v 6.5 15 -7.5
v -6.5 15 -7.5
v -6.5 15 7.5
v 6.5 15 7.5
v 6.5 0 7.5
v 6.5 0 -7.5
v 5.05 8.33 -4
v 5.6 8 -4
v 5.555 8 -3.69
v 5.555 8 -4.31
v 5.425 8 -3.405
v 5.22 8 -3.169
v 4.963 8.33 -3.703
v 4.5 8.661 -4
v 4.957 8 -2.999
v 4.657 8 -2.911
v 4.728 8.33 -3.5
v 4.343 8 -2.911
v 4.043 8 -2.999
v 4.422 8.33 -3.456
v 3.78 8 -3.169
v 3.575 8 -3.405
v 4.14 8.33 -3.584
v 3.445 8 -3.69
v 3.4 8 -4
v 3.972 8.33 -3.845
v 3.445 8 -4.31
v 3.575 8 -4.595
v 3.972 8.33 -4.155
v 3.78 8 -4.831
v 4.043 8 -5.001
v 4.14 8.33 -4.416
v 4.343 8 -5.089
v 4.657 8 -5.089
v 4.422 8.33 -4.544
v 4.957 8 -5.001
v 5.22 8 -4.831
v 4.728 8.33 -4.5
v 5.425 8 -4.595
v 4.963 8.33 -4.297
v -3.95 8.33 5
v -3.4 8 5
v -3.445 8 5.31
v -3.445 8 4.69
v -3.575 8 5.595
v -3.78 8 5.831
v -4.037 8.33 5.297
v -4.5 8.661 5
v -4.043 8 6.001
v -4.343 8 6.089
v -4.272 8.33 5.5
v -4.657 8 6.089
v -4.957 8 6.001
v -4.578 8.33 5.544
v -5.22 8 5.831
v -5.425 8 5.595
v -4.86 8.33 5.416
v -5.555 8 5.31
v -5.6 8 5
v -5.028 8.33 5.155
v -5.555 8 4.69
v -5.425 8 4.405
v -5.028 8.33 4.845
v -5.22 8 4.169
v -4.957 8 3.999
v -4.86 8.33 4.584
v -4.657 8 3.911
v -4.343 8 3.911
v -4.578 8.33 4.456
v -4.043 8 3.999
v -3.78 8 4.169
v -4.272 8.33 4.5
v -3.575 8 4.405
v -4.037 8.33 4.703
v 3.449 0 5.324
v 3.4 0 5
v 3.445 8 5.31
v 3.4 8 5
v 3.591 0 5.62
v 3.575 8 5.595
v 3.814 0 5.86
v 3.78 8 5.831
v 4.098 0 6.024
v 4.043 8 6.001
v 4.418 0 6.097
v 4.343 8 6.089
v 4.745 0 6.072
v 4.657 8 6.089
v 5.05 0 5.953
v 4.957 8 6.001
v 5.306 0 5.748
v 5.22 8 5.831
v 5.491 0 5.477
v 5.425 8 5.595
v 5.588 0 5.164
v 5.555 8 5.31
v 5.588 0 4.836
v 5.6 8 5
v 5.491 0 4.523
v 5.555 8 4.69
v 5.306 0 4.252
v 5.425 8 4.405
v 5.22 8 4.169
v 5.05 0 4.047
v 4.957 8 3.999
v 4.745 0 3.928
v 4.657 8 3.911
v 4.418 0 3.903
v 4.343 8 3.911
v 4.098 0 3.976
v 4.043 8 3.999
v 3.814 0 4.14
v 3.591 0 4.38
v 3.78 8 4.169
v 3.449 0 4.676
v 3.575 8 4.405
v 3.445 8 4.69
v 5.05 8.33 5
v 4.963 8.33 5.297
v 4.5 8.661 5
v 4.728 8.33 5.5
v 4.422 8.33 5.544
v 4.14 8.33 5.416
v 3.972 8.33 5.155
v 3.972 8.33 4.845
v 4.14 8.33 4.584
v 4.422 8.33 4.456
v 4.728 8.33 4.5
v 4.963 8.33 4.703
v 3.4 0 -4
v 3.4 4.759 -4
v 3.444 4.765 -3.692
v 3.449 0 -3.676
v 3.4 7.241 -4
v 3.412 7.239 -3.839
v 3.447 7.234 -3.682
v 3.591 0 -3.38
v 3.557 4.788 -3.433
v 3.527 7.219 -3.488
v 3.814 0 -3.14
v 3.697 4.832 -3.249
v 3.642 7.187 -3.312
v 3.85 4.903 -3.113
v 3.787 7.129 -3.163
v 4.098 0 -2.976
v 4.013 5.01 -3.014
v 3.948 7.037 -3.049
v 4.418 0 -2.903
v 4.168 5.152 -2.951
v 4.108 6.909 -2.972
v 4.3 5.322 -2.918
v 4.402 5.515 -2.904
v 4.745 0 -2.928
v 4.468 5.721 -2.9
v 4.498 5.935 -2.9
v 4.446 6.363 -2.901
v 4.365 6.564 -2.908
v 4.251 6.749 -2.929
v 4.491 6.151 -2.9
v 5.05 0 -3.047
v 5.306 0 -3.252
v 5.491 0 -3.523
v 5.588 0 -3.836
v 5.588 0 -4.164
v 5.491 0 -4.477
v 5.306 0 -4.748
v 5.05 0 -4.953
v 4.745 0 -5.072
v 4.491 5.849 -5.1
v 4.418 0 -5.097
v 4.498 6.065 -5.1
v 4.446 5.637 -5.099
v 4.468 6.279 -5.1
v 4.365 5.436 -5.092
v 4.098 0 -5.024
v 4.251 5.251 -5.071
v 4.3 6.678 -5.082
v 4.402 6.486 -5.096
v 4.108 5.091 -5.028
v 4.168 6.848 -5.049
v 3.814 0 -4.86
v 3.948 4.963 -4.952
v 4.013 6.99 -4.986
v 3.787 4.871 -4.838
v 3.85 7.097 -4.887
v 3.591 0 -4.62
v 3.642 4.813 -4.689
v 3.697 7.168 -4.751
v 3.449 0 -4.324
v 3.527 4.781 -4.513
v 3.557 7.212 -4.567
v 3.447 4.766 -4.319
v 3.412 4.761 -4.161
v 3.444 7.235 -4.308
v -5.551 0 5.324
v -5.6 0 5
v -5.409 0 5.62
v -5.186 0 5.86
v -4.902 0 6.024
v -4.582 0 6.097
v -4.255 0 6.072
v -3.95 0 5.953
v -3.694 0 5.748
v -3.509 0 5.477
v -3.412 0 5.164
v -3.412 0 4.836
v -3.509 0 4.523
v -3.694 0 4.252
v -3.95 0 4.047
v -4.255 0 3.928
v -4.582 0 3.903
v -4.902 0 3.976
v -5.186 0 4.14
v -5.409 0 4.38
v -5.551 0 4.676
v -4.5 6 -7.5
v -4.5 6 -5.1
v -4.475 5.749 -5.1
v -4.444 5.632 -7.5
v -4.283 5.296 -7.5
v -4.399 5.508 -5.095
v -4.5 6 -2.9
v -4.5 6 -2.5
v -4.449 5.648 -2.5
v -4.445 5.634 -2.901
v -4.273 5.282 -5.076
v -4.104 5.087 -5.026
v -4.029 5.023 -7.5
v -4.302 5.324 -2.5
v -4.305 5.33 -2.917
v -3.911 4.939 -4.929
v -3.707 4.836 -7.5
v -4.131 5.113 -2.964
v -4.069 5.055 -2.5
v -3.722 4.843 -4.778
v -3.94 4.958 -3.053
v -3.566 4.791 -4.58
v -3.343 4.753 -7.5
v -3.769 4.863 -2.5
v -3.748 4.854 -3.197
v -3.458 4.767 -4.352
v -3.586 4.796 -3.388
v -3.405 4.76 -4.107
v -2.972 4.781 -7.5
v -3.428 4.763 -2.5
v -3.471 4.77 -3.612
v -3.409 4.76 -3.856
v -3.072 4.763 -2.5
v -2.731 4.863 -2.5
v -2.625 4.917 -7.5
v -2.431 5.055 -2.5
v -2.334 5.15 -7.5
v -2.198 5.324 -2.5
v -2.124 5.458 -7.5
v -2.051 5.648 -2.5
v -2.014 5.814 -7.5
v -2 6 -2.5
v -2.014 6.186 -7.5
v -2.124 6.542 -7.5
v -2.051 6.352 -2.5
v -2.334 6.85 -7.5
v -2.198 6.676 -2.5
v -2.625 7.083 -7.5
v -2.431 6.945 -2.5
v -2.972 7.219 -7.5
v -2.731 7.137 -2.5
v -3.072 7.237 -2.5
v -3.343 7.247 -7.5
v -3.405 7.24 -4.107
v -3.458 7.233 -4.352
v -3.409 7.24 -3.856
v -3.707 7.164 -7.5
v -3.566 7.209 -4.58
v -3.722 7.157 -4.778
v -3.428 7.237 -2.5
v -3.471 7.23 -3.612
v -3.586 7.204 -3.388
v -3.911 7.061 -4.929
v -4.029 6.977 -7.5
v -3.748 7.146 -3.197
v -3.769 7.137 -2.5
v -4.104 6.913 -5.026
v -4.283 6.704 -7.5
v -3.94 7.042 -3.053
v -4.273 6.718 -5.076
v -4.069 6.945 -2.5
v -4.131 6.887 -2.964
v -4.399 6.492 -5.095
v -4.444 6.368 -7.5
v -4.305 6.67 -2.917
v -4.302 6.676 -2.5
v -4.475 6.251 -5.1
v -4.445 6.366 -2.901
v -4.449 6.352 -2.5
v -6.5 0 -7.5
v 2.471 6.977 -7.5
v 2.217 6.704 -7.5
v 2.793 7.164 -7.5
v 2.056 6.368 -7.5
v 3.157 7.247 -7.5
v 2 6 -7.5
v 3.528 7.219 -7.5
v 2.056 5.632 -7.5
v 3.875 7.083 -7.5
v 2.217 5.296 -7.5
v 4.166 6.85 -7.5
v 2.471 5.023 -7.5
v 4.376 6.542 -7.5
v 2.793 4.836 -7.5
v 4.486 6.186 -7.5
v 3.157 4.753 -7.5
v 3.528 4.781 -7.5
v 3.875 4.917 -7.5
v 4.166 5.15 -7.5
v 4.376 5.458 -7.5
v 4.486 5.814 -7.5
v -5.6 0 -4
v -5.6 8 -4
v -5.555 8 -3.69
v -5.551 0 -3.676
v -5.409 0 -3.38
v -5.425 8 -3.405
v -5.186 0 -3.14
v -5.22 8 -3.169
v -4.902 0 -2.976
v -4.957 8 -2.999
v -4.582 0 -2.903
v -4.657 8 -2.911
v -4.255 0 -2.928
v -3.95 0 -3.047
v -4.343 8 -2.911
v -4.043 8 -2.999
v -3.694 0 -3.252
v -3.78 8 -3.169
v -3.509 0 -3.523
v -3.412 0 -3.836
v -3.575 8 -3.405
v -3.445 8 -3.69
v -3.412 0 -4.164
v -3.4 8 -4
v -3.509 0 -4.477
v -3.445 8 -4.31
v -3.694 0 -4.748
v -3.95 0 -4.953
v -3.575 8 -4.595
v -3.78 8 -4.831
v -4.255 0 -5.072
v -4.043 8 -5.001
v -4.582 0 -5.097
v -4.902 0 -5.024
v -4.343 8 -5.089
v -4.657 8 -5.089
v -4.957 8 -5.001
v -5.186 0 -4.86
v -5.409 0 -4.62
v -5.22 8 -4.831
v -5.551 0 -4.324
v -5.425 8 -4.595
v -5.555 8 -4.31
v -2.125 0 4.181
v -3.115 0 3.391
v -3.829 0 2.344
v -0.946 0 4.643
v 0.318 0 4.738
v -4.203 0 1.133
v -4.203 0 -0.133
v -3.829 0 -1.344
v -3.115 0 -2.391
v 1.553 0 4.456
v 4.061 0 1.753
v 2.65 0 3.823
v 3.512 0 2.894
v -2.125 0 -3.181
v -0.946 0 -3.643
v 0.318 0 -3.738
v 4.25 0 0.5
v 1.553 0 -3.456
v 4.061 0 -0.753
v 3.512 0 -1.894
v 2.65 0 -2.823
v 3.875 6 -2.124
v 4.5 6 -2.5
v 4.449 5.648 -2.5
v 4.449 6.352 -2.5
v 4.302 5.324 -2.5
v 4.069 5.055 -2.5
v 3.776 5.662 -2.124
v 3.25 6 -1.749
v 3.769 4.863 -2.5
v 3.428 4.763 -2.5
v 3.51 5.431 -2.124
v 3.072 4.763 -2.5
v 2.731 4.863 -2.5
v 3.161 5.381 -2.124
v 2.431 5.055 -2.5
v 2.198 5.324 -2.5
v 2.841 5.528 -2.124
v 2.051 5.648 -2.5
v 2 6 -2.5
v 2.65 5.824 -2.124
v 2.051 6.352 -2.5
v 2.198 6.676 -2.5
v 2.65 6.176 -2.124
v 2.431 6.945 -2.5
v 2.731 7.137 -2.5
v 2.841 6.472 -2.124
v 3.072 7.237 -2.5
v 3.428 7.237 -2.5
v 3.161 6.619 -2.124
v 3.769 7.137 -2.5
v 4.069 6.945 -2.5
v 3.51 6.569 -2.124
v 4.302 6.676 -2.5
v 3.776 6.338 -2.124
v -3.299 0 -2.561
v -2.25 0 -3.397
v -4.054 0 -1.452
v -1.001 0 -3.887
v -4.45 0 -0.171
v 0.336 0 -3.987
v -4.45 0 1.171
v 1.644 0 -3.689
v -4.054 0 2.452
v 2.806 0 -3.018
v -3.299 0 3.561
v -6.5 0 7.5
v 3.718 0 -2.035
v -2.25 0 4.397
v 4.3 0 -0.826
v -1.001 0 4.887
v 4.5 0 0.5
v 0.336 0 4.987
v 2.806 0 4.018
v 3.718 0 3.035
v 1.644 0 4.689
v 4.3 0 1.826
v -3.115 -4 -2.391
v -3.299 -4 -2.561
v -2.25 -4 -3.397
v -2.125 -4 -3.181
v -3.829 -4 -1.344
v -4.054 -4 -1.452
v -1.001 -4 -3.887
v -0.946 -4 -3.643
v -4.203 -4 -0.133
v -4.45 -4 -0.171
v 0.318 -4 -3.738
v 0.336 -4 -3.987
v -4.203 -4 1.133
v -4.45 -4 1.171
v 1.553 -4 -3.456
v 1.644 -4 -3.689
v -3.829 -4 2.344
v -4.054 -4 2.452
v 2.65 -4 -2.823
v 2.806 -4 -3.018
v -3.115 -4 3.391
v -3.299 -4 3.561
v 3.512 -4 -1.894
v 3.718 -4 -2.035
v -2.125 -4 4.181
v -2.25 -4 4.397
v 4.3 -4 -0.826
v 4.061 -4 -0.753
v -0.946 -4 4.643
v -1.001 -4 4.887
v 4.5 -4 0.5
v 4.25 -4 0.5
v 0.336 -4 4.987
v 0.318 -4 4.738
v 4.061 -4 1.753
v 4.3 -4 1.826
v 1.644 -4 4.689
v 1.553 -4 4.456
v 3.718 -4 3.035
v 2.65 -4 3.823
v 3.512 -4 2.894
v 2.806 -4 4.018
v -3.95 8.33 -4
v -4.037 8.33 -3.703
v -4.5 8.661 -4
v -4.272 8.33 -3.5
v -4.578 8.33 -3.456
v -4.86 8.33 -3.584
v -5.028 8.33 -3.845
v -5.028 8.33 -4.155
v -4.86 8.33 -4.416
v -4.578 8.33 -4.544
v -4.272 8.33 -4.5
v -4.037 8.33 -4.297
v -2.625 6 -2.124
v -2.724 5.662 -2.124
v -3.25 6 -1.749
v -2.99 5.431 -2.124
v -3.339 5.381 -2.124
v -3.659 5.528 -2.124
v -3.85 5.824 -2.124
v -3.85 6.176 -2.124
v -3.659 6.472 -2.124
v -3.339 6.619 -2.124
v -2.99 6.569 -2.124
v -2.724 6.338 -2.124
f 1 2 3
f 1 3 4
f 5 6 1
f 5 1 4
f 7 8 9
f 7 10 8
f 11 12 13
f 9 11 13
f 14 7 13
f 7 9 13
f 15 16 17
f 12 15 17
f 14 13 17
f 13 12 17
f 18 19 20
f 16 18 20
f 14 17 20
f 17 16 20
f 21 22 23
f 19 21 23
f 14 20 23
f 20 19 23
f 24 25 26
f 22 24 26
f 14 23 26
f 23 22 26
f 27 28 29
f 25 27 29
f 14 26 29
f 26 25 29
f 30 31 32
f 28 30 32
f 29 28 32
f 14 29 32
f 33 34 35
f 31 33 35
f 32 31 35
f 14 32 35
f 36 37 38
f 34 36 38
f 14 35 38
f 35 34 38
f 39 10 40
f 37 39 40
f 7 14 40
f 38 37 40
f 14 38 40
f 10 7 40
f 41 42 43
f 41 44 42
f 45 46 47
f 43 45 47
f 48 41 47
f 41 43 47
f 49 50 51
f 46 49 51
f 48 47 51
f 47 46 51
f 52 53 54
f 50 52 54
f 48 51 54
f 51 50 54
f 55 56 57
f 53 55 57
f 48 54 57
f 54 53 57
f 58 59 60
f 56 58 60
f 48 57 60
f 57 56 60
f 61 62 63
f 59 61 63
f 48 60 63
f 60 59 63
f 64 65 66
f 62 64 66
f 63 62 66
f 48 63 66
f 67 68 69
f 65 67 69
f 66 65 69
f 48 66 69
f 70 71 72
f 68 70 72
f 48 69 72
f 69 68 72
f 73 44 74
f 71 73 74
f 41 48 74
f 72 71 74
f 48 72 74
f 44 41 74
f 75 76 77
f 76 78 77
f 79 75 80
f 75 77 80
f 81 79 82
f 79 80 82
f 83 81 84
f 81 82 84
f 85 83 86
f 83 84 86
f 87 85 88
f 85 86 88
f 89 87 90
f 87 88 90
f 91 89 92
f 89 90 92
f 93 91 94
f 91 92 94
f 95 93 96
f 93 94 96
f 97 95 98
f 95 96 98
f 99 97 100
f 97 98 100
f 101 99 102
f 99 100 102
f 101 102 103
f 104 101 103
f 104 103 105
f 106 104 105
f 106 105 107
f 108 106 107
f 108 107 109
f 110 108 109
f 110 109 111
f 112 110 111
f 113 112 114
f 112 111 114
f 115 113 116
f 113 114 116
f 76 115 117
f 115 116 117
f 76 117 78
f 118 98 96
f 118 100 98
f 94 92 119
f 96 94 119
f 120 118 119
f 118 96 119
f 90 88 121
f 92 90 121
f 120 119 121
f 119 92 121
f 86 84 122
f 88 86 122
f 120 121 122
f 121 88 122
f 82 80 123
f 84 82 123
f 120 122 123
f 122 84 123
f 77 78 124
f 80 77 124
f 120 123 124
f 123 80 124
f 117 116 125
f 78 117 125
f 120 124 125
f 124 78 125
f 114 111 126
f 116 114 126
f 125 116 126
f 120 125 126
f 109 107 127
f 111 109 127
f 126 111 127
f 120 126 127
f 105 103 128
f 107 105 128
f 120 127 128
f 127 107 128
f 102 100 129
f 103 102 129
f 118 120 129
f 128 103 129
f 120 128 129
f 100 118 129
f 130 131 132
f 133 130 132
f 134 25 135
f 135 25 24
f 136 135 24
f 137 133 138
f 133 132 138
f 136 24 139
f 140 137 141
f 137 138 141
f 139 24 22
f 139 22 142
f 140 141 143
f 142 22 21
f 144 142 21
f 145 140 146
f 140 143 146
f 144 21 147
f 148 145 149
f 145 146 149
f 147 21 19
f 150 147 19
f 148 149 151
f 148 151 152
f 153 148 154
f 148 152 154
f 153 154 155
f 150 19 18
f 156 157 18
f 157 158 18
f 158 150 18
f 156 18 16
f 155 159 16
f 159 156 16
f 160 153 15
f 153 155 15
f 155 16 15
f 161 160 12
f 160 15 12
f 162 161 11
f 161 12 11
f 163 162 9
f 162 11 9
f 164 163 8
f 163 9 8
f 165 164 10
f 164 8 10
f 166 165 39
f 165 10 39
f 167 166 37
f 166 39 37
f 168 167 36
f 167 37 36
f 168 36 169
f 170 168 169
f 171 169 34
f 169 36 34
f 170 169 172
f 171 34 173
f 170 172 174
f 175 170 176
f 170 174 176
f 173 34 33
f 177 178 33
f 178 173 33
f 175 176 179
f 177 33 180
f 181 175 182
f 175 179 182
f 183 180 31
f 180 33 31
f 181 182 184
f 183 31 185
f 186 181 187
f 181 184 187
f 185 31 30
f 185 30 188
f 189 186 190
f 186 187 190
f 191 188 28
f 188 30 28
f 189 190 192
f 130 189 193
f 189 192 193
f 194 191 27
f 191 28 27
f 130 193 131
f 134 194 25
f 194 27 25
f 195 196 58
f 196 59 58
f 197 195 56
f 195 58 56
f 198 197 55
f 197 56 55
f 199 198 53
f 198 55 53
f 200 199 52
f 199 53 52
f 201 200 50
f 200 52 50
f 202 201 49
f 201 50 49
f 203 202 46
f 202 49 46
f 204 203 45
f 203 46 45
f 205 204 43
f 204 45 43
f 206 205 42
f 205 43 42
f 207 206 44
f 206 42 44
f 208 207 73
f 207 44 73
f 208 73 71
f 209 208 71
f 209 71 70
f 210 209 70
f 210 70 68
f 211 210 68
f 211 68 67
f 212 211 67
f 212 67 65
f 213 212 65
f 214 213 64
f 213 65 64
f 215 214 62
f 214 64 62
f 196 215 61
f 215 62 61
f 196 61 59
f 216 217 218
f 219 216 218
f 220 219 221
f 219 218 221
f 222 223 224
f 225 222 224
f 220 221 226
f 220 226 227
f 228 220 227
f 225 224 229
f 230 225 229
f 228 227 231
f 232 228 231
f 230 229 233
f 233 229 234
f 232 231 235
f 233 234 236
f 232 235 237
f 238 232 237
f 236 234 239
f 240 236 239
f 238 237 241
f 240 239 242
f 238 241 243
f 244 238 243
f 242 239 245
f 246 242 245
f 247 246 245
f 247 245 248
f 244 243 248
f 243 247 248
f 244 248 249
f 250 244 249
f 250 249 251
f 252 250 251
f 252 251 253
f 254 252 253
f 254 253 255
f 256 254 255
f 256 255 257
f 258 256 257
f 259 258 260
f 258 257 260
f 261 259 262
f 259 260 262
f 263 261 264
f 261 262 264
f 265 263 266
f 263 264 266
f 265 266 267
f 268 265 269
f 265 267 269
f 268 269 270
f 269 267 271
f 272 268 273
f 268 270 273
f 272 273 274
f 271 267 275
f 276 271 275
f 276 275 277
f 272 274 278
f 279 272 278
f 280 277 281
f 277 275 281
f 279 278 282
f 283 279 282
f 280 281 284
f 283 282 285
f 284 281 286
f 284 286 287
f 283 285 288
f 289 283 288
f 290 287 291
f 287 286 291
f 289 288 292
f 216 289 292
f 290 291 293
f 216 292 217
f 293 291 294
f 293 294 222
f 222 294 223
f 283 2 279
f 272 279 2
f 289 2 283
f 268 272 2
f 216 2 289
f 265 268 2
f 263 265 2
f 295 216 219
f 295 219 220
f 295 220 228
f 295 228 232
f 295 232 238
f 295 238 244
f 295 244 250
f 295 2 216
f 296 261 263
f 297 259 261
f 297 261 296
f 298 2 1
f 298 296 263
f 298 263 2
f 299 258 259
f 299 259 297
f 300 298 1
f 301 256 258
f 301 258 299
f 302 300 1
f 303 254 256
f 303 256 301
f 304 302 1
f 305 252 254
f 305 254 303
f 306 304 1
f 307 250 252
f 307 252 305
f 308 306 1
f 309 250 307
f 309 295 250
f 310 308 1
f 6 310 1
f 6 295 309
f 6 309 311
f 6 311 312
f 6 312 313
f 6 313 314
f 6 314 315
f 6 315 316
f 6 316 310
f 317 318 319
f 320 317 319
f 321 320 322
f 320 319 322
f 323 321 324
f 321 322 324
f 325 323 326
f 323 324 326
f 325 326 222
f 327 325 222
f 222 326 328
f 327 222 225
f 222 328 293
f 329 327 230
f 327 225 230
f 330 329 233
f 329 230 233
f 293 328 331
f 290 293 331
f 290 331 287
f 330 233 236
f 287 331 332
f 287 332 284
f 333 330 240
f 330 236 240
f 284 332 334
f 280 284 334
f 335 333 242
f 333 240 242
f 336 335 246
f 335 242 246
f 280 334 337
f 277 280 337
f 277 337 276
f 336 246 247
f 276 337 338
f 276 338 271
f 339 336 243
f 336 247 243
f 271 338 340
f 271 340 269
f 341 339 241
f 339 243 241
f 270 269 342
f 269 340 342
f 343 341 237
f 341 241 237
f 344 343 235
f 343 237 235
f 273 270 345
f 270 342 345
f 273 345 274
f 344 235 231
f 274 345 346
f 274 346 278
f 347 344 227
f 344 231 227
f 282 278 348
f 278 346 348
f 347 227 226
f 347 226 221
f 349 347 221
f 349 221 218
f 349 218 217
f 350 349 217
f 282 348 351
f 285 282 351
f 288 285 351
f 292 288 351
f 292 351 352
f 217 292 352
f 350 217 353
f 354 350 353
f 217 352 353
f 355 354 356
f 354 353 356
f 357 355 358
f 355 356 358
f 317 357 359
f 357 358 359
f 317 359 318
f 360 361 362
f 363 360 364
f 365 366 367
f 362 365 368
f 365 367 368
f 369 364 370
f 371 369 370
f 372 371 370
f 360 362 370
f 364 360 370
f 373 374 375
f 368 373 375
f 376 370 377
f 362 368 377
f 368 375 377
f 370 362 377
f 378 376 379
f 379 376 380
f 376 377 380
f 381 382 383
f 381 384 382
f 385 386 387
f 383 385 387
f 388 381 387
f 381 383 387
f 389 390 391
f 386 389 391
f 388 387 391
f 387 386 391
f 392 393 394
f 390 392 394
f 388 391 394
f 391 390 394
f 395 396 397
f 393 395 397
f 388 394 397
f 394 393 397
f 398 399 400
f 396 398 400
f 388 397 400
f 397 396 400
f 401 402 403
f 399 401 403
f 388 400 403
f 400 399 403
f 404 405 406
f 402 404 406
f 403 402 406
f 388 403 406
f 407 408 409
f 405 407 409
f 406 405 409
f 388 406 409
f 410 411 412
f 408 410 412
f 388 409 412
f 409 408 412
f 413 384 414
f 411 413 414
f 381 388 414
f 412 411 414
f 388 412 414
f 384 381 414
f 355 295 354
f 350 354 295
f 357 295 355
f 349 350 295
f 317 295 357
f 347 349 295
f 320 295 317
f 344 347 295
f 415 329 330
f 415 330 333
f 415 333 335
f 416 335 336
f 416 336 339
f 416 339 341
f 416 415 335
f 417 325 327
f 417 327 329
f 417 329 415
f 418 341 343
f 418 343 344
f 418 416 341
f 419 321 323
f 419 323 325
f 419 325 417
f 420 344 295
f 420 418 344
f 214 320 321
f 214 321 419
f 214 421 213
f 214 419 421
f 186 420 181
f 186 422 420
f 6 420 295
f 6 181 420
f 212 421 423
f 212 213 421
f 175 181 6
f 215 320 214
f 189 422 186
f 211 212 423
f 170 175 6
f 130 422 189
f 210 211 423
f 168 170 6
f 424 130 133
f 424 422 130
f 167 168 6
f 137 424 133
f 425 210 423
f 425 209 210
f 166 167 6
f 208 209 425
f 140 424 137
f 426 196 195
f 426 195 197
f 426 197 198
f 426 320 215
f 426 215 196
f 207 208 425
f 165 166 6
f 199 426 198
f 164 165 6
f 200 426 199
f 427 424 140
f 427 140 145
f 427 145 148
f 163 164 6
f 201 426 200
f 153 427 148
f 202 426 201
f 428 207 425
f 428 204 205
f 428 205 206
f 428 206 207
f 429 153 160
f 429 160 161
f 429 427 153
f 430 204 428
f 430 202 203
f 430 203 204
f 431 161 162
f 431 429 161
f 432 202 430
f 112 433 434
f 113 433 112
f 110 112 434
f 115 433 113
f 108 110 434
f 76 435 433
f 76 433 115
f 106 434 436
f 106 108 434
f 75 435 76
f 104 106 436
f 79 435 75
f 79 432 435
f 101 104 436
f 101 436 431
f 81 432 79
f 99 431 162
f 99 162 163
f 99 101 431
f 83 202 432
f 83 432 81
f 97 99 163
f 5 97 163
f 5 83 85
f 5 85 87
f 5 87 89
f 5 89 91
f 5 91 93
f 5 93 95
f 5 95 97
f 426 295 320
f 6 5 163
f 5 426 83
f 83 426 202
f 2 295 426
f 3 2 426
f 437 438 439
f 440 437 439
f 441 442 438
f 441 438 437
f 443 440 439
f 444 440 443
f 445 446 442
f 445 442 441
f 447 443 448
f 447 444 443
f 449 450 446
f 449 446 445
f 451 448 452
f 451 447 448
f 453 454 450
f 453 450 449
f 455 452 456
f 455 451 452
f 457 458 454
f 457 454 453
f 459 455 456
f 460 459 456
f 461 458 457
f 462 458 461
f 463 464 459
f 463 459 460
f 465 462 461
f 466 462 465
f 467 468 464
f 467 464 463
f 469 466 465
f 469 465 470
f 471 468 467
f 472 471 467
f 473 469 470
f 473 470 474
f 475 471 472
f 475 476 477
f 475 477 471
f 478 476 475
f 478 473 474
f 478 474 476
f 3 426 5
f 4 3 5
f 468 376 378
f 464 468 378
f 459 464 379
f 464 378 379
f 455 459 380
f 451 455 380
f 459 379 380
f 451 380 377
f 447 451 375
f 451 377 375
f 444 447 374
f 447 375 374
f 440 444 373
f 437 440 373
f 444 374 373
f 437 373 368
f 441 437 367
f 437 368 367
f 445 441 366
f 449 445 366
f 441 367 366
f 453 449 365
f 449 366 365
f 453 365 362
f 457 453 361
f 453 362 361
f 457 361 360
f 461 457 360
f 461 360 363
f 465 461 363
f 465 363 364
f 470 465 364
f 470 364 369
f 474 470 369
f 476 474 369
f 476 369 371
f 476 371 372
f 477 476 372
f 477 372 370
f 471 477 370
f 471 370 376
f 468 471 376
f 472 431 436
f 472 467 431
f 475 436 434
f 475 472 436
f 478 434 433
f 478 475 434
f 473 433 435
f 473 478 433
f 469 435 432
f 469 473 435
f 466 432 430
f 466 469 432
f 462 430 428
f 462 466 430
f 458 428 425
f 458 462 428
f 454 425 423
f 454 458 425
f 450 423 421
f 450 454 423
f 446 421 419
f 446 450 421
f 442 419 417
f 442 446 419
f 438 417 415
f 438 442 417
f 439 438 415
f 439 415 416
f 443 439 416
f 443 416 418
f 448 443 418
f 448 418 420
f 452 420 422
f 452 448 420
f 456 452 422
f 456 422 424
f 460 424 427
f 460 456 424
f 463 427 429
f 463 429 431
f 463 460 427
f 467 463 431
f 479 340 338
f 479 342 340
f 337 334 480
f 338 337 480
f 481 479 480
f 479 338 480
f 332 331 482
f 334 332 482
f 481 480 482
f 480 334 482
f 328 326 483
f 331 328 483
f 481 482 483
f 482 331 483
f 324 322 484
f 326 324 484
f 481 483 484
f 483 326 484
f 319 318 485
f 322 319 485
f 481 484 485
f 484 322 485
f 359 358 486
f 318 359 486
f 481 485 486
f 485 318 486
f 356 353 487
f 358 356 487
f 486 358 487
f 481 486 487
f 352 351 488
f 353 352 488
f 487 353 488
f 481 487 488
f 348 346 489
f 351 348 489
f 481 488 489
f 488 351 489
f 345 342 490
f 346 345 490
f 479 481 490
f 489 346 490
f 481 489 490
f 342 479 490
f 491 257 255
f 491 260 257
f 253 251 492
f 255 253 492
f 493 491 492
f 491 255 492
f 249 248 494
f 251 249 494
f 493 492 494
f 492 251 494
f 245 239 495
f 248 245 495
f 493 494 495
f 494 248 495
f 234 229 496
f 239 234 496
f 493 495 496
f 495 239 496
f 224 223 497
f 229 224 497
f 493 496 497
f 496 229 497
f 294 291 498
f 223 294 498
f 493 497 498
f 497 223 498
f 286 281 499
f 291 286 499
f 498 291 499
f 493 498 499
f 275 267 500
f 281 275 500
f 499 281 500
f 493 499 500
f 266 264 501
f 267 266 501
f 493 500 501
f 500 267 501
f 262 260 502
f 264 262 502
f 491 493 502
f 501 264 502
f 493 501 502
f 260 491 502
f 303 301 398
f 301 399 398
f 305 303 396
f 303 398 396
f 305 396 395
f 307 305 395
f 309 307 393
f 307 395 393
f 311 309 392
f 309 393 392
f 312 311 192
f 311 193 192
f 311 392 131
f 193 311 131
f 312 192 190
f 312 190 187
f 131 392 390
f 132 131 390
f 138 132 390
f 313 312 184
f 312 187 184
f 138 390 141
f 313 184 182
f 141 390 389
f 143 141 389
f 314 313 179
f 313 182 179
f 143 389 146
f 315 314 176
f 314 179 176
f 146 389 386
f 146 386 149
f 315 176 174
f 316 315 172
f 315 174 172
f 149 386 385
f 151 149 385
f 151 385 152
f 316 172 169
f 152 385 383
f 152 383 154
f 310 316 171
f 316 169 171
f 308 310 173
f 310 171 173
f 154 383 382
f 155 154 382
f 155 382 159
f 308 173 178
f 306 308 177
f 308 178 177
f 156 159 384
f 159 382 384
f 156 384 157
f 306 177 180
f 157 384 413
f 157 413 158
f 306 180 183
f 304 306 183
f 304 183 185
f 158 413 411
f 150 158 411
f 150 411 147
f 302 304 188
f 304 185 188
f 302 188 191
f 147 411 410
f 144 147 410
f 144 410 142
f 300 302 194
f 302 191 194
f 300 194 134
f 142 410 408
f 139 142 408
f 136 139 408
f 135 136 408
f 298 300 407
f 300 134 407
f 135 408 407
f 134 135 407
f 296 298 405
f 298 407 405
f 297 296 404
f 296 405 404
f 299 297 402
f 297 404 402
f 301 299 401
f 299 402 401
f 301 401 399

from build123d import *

# Parameters (mm, degrees)
F0_R          = 4.5
F1_DEPTH      = 4
F1_DEPTH_BACK = 15
F0_W          = 13
F0_H          = 15
F2_DEPTH      = 15
F3_D          = 2.2
F3_DEPTH      = 8
F3_TIP        = 0.6609466809
F4_D          = 8.5
F4_DEPTH      = 8
F4_TIP        = 2.5536576309
F6_D          = 2.5
F6_DEPTH      = 5
F6_TIP        = 0.7510757738


with BuildPart() as f1:
    # F0 (on Front) → F1 (new body, two sides)
    with BuildSketch(Plane.XZ) as f1_sk:
        with Locations((0, 0.5)):
            Circle(F0_R)
    extrude(amount=F1_DEPTH)
    extrude(f1_sk.sketch, amount=-F1_DEPTH_BACK)

    # F0 (on Front) → F2 (join)
    with BuildSketch(Plane.XZ):
        Rectangle(F0_W, F0_H)
        with Locations((0, 0.5)):
            Circle(F0_R, mode=Mode.SUBTRACT)
    extrude(amount=-F2_DEPTH)

    # F3
    with Locations(Plane.XZ):
        with Locations((4.5, 5), (4.5, -4), (-4.5, 5), (-4.5, -4)):
            Hole(F3_D / 2, depth=F3_DEPTH)
            with Locations((0, 0, -(F3_DEPTH + F3_TIP / 2))):  # 118° drill point
                Cone(0, F3_D / 2, F3_TIP, mode=Mode.SUBTRACT)

    # F4 (one way)
    with BuildSketch(Plane(origin=(0, 0, 0), x_dir=(1, 0, 0), z_dir=(0, 1, 0))):
        with Locations((0, -0.5)):
            Circle(F4_D / 2)
    extrude(amount=-F4_DEPTH, mode=Mode.SUBTRACT)
    with Locations(Plane(origin=(0, 0, 0), x_dir=(1, 0, 0), z_dir=(0, 1, 0))):
        with Locations((0, -0.5)):
            with Locations((0, 0, -(F4_DEPTH + F4_TIP / 2))):  # 118° drill point
                Cone(0, F4_D / 2, F4_TIP, mode=Mode.SUBTRACT)

    # F6
    with Locations(Plane(origin=(0, 0, -7.5), x_dir=(1, 0, 0), z_dir=(0, 0, -1))):
        with Locations((-3.25, -6), (3.25, -6)):
            Hole(F6_D / 2, depth=F6_DEPTH)
            with Locations((0, 0, -(F6_DEPTH + F6_TIP / 2))):  # 118° drill point
                Cone(0, F6_D / 2, F6_TIP, mode=Mode.SUBTRACT)


solid = f1.part
